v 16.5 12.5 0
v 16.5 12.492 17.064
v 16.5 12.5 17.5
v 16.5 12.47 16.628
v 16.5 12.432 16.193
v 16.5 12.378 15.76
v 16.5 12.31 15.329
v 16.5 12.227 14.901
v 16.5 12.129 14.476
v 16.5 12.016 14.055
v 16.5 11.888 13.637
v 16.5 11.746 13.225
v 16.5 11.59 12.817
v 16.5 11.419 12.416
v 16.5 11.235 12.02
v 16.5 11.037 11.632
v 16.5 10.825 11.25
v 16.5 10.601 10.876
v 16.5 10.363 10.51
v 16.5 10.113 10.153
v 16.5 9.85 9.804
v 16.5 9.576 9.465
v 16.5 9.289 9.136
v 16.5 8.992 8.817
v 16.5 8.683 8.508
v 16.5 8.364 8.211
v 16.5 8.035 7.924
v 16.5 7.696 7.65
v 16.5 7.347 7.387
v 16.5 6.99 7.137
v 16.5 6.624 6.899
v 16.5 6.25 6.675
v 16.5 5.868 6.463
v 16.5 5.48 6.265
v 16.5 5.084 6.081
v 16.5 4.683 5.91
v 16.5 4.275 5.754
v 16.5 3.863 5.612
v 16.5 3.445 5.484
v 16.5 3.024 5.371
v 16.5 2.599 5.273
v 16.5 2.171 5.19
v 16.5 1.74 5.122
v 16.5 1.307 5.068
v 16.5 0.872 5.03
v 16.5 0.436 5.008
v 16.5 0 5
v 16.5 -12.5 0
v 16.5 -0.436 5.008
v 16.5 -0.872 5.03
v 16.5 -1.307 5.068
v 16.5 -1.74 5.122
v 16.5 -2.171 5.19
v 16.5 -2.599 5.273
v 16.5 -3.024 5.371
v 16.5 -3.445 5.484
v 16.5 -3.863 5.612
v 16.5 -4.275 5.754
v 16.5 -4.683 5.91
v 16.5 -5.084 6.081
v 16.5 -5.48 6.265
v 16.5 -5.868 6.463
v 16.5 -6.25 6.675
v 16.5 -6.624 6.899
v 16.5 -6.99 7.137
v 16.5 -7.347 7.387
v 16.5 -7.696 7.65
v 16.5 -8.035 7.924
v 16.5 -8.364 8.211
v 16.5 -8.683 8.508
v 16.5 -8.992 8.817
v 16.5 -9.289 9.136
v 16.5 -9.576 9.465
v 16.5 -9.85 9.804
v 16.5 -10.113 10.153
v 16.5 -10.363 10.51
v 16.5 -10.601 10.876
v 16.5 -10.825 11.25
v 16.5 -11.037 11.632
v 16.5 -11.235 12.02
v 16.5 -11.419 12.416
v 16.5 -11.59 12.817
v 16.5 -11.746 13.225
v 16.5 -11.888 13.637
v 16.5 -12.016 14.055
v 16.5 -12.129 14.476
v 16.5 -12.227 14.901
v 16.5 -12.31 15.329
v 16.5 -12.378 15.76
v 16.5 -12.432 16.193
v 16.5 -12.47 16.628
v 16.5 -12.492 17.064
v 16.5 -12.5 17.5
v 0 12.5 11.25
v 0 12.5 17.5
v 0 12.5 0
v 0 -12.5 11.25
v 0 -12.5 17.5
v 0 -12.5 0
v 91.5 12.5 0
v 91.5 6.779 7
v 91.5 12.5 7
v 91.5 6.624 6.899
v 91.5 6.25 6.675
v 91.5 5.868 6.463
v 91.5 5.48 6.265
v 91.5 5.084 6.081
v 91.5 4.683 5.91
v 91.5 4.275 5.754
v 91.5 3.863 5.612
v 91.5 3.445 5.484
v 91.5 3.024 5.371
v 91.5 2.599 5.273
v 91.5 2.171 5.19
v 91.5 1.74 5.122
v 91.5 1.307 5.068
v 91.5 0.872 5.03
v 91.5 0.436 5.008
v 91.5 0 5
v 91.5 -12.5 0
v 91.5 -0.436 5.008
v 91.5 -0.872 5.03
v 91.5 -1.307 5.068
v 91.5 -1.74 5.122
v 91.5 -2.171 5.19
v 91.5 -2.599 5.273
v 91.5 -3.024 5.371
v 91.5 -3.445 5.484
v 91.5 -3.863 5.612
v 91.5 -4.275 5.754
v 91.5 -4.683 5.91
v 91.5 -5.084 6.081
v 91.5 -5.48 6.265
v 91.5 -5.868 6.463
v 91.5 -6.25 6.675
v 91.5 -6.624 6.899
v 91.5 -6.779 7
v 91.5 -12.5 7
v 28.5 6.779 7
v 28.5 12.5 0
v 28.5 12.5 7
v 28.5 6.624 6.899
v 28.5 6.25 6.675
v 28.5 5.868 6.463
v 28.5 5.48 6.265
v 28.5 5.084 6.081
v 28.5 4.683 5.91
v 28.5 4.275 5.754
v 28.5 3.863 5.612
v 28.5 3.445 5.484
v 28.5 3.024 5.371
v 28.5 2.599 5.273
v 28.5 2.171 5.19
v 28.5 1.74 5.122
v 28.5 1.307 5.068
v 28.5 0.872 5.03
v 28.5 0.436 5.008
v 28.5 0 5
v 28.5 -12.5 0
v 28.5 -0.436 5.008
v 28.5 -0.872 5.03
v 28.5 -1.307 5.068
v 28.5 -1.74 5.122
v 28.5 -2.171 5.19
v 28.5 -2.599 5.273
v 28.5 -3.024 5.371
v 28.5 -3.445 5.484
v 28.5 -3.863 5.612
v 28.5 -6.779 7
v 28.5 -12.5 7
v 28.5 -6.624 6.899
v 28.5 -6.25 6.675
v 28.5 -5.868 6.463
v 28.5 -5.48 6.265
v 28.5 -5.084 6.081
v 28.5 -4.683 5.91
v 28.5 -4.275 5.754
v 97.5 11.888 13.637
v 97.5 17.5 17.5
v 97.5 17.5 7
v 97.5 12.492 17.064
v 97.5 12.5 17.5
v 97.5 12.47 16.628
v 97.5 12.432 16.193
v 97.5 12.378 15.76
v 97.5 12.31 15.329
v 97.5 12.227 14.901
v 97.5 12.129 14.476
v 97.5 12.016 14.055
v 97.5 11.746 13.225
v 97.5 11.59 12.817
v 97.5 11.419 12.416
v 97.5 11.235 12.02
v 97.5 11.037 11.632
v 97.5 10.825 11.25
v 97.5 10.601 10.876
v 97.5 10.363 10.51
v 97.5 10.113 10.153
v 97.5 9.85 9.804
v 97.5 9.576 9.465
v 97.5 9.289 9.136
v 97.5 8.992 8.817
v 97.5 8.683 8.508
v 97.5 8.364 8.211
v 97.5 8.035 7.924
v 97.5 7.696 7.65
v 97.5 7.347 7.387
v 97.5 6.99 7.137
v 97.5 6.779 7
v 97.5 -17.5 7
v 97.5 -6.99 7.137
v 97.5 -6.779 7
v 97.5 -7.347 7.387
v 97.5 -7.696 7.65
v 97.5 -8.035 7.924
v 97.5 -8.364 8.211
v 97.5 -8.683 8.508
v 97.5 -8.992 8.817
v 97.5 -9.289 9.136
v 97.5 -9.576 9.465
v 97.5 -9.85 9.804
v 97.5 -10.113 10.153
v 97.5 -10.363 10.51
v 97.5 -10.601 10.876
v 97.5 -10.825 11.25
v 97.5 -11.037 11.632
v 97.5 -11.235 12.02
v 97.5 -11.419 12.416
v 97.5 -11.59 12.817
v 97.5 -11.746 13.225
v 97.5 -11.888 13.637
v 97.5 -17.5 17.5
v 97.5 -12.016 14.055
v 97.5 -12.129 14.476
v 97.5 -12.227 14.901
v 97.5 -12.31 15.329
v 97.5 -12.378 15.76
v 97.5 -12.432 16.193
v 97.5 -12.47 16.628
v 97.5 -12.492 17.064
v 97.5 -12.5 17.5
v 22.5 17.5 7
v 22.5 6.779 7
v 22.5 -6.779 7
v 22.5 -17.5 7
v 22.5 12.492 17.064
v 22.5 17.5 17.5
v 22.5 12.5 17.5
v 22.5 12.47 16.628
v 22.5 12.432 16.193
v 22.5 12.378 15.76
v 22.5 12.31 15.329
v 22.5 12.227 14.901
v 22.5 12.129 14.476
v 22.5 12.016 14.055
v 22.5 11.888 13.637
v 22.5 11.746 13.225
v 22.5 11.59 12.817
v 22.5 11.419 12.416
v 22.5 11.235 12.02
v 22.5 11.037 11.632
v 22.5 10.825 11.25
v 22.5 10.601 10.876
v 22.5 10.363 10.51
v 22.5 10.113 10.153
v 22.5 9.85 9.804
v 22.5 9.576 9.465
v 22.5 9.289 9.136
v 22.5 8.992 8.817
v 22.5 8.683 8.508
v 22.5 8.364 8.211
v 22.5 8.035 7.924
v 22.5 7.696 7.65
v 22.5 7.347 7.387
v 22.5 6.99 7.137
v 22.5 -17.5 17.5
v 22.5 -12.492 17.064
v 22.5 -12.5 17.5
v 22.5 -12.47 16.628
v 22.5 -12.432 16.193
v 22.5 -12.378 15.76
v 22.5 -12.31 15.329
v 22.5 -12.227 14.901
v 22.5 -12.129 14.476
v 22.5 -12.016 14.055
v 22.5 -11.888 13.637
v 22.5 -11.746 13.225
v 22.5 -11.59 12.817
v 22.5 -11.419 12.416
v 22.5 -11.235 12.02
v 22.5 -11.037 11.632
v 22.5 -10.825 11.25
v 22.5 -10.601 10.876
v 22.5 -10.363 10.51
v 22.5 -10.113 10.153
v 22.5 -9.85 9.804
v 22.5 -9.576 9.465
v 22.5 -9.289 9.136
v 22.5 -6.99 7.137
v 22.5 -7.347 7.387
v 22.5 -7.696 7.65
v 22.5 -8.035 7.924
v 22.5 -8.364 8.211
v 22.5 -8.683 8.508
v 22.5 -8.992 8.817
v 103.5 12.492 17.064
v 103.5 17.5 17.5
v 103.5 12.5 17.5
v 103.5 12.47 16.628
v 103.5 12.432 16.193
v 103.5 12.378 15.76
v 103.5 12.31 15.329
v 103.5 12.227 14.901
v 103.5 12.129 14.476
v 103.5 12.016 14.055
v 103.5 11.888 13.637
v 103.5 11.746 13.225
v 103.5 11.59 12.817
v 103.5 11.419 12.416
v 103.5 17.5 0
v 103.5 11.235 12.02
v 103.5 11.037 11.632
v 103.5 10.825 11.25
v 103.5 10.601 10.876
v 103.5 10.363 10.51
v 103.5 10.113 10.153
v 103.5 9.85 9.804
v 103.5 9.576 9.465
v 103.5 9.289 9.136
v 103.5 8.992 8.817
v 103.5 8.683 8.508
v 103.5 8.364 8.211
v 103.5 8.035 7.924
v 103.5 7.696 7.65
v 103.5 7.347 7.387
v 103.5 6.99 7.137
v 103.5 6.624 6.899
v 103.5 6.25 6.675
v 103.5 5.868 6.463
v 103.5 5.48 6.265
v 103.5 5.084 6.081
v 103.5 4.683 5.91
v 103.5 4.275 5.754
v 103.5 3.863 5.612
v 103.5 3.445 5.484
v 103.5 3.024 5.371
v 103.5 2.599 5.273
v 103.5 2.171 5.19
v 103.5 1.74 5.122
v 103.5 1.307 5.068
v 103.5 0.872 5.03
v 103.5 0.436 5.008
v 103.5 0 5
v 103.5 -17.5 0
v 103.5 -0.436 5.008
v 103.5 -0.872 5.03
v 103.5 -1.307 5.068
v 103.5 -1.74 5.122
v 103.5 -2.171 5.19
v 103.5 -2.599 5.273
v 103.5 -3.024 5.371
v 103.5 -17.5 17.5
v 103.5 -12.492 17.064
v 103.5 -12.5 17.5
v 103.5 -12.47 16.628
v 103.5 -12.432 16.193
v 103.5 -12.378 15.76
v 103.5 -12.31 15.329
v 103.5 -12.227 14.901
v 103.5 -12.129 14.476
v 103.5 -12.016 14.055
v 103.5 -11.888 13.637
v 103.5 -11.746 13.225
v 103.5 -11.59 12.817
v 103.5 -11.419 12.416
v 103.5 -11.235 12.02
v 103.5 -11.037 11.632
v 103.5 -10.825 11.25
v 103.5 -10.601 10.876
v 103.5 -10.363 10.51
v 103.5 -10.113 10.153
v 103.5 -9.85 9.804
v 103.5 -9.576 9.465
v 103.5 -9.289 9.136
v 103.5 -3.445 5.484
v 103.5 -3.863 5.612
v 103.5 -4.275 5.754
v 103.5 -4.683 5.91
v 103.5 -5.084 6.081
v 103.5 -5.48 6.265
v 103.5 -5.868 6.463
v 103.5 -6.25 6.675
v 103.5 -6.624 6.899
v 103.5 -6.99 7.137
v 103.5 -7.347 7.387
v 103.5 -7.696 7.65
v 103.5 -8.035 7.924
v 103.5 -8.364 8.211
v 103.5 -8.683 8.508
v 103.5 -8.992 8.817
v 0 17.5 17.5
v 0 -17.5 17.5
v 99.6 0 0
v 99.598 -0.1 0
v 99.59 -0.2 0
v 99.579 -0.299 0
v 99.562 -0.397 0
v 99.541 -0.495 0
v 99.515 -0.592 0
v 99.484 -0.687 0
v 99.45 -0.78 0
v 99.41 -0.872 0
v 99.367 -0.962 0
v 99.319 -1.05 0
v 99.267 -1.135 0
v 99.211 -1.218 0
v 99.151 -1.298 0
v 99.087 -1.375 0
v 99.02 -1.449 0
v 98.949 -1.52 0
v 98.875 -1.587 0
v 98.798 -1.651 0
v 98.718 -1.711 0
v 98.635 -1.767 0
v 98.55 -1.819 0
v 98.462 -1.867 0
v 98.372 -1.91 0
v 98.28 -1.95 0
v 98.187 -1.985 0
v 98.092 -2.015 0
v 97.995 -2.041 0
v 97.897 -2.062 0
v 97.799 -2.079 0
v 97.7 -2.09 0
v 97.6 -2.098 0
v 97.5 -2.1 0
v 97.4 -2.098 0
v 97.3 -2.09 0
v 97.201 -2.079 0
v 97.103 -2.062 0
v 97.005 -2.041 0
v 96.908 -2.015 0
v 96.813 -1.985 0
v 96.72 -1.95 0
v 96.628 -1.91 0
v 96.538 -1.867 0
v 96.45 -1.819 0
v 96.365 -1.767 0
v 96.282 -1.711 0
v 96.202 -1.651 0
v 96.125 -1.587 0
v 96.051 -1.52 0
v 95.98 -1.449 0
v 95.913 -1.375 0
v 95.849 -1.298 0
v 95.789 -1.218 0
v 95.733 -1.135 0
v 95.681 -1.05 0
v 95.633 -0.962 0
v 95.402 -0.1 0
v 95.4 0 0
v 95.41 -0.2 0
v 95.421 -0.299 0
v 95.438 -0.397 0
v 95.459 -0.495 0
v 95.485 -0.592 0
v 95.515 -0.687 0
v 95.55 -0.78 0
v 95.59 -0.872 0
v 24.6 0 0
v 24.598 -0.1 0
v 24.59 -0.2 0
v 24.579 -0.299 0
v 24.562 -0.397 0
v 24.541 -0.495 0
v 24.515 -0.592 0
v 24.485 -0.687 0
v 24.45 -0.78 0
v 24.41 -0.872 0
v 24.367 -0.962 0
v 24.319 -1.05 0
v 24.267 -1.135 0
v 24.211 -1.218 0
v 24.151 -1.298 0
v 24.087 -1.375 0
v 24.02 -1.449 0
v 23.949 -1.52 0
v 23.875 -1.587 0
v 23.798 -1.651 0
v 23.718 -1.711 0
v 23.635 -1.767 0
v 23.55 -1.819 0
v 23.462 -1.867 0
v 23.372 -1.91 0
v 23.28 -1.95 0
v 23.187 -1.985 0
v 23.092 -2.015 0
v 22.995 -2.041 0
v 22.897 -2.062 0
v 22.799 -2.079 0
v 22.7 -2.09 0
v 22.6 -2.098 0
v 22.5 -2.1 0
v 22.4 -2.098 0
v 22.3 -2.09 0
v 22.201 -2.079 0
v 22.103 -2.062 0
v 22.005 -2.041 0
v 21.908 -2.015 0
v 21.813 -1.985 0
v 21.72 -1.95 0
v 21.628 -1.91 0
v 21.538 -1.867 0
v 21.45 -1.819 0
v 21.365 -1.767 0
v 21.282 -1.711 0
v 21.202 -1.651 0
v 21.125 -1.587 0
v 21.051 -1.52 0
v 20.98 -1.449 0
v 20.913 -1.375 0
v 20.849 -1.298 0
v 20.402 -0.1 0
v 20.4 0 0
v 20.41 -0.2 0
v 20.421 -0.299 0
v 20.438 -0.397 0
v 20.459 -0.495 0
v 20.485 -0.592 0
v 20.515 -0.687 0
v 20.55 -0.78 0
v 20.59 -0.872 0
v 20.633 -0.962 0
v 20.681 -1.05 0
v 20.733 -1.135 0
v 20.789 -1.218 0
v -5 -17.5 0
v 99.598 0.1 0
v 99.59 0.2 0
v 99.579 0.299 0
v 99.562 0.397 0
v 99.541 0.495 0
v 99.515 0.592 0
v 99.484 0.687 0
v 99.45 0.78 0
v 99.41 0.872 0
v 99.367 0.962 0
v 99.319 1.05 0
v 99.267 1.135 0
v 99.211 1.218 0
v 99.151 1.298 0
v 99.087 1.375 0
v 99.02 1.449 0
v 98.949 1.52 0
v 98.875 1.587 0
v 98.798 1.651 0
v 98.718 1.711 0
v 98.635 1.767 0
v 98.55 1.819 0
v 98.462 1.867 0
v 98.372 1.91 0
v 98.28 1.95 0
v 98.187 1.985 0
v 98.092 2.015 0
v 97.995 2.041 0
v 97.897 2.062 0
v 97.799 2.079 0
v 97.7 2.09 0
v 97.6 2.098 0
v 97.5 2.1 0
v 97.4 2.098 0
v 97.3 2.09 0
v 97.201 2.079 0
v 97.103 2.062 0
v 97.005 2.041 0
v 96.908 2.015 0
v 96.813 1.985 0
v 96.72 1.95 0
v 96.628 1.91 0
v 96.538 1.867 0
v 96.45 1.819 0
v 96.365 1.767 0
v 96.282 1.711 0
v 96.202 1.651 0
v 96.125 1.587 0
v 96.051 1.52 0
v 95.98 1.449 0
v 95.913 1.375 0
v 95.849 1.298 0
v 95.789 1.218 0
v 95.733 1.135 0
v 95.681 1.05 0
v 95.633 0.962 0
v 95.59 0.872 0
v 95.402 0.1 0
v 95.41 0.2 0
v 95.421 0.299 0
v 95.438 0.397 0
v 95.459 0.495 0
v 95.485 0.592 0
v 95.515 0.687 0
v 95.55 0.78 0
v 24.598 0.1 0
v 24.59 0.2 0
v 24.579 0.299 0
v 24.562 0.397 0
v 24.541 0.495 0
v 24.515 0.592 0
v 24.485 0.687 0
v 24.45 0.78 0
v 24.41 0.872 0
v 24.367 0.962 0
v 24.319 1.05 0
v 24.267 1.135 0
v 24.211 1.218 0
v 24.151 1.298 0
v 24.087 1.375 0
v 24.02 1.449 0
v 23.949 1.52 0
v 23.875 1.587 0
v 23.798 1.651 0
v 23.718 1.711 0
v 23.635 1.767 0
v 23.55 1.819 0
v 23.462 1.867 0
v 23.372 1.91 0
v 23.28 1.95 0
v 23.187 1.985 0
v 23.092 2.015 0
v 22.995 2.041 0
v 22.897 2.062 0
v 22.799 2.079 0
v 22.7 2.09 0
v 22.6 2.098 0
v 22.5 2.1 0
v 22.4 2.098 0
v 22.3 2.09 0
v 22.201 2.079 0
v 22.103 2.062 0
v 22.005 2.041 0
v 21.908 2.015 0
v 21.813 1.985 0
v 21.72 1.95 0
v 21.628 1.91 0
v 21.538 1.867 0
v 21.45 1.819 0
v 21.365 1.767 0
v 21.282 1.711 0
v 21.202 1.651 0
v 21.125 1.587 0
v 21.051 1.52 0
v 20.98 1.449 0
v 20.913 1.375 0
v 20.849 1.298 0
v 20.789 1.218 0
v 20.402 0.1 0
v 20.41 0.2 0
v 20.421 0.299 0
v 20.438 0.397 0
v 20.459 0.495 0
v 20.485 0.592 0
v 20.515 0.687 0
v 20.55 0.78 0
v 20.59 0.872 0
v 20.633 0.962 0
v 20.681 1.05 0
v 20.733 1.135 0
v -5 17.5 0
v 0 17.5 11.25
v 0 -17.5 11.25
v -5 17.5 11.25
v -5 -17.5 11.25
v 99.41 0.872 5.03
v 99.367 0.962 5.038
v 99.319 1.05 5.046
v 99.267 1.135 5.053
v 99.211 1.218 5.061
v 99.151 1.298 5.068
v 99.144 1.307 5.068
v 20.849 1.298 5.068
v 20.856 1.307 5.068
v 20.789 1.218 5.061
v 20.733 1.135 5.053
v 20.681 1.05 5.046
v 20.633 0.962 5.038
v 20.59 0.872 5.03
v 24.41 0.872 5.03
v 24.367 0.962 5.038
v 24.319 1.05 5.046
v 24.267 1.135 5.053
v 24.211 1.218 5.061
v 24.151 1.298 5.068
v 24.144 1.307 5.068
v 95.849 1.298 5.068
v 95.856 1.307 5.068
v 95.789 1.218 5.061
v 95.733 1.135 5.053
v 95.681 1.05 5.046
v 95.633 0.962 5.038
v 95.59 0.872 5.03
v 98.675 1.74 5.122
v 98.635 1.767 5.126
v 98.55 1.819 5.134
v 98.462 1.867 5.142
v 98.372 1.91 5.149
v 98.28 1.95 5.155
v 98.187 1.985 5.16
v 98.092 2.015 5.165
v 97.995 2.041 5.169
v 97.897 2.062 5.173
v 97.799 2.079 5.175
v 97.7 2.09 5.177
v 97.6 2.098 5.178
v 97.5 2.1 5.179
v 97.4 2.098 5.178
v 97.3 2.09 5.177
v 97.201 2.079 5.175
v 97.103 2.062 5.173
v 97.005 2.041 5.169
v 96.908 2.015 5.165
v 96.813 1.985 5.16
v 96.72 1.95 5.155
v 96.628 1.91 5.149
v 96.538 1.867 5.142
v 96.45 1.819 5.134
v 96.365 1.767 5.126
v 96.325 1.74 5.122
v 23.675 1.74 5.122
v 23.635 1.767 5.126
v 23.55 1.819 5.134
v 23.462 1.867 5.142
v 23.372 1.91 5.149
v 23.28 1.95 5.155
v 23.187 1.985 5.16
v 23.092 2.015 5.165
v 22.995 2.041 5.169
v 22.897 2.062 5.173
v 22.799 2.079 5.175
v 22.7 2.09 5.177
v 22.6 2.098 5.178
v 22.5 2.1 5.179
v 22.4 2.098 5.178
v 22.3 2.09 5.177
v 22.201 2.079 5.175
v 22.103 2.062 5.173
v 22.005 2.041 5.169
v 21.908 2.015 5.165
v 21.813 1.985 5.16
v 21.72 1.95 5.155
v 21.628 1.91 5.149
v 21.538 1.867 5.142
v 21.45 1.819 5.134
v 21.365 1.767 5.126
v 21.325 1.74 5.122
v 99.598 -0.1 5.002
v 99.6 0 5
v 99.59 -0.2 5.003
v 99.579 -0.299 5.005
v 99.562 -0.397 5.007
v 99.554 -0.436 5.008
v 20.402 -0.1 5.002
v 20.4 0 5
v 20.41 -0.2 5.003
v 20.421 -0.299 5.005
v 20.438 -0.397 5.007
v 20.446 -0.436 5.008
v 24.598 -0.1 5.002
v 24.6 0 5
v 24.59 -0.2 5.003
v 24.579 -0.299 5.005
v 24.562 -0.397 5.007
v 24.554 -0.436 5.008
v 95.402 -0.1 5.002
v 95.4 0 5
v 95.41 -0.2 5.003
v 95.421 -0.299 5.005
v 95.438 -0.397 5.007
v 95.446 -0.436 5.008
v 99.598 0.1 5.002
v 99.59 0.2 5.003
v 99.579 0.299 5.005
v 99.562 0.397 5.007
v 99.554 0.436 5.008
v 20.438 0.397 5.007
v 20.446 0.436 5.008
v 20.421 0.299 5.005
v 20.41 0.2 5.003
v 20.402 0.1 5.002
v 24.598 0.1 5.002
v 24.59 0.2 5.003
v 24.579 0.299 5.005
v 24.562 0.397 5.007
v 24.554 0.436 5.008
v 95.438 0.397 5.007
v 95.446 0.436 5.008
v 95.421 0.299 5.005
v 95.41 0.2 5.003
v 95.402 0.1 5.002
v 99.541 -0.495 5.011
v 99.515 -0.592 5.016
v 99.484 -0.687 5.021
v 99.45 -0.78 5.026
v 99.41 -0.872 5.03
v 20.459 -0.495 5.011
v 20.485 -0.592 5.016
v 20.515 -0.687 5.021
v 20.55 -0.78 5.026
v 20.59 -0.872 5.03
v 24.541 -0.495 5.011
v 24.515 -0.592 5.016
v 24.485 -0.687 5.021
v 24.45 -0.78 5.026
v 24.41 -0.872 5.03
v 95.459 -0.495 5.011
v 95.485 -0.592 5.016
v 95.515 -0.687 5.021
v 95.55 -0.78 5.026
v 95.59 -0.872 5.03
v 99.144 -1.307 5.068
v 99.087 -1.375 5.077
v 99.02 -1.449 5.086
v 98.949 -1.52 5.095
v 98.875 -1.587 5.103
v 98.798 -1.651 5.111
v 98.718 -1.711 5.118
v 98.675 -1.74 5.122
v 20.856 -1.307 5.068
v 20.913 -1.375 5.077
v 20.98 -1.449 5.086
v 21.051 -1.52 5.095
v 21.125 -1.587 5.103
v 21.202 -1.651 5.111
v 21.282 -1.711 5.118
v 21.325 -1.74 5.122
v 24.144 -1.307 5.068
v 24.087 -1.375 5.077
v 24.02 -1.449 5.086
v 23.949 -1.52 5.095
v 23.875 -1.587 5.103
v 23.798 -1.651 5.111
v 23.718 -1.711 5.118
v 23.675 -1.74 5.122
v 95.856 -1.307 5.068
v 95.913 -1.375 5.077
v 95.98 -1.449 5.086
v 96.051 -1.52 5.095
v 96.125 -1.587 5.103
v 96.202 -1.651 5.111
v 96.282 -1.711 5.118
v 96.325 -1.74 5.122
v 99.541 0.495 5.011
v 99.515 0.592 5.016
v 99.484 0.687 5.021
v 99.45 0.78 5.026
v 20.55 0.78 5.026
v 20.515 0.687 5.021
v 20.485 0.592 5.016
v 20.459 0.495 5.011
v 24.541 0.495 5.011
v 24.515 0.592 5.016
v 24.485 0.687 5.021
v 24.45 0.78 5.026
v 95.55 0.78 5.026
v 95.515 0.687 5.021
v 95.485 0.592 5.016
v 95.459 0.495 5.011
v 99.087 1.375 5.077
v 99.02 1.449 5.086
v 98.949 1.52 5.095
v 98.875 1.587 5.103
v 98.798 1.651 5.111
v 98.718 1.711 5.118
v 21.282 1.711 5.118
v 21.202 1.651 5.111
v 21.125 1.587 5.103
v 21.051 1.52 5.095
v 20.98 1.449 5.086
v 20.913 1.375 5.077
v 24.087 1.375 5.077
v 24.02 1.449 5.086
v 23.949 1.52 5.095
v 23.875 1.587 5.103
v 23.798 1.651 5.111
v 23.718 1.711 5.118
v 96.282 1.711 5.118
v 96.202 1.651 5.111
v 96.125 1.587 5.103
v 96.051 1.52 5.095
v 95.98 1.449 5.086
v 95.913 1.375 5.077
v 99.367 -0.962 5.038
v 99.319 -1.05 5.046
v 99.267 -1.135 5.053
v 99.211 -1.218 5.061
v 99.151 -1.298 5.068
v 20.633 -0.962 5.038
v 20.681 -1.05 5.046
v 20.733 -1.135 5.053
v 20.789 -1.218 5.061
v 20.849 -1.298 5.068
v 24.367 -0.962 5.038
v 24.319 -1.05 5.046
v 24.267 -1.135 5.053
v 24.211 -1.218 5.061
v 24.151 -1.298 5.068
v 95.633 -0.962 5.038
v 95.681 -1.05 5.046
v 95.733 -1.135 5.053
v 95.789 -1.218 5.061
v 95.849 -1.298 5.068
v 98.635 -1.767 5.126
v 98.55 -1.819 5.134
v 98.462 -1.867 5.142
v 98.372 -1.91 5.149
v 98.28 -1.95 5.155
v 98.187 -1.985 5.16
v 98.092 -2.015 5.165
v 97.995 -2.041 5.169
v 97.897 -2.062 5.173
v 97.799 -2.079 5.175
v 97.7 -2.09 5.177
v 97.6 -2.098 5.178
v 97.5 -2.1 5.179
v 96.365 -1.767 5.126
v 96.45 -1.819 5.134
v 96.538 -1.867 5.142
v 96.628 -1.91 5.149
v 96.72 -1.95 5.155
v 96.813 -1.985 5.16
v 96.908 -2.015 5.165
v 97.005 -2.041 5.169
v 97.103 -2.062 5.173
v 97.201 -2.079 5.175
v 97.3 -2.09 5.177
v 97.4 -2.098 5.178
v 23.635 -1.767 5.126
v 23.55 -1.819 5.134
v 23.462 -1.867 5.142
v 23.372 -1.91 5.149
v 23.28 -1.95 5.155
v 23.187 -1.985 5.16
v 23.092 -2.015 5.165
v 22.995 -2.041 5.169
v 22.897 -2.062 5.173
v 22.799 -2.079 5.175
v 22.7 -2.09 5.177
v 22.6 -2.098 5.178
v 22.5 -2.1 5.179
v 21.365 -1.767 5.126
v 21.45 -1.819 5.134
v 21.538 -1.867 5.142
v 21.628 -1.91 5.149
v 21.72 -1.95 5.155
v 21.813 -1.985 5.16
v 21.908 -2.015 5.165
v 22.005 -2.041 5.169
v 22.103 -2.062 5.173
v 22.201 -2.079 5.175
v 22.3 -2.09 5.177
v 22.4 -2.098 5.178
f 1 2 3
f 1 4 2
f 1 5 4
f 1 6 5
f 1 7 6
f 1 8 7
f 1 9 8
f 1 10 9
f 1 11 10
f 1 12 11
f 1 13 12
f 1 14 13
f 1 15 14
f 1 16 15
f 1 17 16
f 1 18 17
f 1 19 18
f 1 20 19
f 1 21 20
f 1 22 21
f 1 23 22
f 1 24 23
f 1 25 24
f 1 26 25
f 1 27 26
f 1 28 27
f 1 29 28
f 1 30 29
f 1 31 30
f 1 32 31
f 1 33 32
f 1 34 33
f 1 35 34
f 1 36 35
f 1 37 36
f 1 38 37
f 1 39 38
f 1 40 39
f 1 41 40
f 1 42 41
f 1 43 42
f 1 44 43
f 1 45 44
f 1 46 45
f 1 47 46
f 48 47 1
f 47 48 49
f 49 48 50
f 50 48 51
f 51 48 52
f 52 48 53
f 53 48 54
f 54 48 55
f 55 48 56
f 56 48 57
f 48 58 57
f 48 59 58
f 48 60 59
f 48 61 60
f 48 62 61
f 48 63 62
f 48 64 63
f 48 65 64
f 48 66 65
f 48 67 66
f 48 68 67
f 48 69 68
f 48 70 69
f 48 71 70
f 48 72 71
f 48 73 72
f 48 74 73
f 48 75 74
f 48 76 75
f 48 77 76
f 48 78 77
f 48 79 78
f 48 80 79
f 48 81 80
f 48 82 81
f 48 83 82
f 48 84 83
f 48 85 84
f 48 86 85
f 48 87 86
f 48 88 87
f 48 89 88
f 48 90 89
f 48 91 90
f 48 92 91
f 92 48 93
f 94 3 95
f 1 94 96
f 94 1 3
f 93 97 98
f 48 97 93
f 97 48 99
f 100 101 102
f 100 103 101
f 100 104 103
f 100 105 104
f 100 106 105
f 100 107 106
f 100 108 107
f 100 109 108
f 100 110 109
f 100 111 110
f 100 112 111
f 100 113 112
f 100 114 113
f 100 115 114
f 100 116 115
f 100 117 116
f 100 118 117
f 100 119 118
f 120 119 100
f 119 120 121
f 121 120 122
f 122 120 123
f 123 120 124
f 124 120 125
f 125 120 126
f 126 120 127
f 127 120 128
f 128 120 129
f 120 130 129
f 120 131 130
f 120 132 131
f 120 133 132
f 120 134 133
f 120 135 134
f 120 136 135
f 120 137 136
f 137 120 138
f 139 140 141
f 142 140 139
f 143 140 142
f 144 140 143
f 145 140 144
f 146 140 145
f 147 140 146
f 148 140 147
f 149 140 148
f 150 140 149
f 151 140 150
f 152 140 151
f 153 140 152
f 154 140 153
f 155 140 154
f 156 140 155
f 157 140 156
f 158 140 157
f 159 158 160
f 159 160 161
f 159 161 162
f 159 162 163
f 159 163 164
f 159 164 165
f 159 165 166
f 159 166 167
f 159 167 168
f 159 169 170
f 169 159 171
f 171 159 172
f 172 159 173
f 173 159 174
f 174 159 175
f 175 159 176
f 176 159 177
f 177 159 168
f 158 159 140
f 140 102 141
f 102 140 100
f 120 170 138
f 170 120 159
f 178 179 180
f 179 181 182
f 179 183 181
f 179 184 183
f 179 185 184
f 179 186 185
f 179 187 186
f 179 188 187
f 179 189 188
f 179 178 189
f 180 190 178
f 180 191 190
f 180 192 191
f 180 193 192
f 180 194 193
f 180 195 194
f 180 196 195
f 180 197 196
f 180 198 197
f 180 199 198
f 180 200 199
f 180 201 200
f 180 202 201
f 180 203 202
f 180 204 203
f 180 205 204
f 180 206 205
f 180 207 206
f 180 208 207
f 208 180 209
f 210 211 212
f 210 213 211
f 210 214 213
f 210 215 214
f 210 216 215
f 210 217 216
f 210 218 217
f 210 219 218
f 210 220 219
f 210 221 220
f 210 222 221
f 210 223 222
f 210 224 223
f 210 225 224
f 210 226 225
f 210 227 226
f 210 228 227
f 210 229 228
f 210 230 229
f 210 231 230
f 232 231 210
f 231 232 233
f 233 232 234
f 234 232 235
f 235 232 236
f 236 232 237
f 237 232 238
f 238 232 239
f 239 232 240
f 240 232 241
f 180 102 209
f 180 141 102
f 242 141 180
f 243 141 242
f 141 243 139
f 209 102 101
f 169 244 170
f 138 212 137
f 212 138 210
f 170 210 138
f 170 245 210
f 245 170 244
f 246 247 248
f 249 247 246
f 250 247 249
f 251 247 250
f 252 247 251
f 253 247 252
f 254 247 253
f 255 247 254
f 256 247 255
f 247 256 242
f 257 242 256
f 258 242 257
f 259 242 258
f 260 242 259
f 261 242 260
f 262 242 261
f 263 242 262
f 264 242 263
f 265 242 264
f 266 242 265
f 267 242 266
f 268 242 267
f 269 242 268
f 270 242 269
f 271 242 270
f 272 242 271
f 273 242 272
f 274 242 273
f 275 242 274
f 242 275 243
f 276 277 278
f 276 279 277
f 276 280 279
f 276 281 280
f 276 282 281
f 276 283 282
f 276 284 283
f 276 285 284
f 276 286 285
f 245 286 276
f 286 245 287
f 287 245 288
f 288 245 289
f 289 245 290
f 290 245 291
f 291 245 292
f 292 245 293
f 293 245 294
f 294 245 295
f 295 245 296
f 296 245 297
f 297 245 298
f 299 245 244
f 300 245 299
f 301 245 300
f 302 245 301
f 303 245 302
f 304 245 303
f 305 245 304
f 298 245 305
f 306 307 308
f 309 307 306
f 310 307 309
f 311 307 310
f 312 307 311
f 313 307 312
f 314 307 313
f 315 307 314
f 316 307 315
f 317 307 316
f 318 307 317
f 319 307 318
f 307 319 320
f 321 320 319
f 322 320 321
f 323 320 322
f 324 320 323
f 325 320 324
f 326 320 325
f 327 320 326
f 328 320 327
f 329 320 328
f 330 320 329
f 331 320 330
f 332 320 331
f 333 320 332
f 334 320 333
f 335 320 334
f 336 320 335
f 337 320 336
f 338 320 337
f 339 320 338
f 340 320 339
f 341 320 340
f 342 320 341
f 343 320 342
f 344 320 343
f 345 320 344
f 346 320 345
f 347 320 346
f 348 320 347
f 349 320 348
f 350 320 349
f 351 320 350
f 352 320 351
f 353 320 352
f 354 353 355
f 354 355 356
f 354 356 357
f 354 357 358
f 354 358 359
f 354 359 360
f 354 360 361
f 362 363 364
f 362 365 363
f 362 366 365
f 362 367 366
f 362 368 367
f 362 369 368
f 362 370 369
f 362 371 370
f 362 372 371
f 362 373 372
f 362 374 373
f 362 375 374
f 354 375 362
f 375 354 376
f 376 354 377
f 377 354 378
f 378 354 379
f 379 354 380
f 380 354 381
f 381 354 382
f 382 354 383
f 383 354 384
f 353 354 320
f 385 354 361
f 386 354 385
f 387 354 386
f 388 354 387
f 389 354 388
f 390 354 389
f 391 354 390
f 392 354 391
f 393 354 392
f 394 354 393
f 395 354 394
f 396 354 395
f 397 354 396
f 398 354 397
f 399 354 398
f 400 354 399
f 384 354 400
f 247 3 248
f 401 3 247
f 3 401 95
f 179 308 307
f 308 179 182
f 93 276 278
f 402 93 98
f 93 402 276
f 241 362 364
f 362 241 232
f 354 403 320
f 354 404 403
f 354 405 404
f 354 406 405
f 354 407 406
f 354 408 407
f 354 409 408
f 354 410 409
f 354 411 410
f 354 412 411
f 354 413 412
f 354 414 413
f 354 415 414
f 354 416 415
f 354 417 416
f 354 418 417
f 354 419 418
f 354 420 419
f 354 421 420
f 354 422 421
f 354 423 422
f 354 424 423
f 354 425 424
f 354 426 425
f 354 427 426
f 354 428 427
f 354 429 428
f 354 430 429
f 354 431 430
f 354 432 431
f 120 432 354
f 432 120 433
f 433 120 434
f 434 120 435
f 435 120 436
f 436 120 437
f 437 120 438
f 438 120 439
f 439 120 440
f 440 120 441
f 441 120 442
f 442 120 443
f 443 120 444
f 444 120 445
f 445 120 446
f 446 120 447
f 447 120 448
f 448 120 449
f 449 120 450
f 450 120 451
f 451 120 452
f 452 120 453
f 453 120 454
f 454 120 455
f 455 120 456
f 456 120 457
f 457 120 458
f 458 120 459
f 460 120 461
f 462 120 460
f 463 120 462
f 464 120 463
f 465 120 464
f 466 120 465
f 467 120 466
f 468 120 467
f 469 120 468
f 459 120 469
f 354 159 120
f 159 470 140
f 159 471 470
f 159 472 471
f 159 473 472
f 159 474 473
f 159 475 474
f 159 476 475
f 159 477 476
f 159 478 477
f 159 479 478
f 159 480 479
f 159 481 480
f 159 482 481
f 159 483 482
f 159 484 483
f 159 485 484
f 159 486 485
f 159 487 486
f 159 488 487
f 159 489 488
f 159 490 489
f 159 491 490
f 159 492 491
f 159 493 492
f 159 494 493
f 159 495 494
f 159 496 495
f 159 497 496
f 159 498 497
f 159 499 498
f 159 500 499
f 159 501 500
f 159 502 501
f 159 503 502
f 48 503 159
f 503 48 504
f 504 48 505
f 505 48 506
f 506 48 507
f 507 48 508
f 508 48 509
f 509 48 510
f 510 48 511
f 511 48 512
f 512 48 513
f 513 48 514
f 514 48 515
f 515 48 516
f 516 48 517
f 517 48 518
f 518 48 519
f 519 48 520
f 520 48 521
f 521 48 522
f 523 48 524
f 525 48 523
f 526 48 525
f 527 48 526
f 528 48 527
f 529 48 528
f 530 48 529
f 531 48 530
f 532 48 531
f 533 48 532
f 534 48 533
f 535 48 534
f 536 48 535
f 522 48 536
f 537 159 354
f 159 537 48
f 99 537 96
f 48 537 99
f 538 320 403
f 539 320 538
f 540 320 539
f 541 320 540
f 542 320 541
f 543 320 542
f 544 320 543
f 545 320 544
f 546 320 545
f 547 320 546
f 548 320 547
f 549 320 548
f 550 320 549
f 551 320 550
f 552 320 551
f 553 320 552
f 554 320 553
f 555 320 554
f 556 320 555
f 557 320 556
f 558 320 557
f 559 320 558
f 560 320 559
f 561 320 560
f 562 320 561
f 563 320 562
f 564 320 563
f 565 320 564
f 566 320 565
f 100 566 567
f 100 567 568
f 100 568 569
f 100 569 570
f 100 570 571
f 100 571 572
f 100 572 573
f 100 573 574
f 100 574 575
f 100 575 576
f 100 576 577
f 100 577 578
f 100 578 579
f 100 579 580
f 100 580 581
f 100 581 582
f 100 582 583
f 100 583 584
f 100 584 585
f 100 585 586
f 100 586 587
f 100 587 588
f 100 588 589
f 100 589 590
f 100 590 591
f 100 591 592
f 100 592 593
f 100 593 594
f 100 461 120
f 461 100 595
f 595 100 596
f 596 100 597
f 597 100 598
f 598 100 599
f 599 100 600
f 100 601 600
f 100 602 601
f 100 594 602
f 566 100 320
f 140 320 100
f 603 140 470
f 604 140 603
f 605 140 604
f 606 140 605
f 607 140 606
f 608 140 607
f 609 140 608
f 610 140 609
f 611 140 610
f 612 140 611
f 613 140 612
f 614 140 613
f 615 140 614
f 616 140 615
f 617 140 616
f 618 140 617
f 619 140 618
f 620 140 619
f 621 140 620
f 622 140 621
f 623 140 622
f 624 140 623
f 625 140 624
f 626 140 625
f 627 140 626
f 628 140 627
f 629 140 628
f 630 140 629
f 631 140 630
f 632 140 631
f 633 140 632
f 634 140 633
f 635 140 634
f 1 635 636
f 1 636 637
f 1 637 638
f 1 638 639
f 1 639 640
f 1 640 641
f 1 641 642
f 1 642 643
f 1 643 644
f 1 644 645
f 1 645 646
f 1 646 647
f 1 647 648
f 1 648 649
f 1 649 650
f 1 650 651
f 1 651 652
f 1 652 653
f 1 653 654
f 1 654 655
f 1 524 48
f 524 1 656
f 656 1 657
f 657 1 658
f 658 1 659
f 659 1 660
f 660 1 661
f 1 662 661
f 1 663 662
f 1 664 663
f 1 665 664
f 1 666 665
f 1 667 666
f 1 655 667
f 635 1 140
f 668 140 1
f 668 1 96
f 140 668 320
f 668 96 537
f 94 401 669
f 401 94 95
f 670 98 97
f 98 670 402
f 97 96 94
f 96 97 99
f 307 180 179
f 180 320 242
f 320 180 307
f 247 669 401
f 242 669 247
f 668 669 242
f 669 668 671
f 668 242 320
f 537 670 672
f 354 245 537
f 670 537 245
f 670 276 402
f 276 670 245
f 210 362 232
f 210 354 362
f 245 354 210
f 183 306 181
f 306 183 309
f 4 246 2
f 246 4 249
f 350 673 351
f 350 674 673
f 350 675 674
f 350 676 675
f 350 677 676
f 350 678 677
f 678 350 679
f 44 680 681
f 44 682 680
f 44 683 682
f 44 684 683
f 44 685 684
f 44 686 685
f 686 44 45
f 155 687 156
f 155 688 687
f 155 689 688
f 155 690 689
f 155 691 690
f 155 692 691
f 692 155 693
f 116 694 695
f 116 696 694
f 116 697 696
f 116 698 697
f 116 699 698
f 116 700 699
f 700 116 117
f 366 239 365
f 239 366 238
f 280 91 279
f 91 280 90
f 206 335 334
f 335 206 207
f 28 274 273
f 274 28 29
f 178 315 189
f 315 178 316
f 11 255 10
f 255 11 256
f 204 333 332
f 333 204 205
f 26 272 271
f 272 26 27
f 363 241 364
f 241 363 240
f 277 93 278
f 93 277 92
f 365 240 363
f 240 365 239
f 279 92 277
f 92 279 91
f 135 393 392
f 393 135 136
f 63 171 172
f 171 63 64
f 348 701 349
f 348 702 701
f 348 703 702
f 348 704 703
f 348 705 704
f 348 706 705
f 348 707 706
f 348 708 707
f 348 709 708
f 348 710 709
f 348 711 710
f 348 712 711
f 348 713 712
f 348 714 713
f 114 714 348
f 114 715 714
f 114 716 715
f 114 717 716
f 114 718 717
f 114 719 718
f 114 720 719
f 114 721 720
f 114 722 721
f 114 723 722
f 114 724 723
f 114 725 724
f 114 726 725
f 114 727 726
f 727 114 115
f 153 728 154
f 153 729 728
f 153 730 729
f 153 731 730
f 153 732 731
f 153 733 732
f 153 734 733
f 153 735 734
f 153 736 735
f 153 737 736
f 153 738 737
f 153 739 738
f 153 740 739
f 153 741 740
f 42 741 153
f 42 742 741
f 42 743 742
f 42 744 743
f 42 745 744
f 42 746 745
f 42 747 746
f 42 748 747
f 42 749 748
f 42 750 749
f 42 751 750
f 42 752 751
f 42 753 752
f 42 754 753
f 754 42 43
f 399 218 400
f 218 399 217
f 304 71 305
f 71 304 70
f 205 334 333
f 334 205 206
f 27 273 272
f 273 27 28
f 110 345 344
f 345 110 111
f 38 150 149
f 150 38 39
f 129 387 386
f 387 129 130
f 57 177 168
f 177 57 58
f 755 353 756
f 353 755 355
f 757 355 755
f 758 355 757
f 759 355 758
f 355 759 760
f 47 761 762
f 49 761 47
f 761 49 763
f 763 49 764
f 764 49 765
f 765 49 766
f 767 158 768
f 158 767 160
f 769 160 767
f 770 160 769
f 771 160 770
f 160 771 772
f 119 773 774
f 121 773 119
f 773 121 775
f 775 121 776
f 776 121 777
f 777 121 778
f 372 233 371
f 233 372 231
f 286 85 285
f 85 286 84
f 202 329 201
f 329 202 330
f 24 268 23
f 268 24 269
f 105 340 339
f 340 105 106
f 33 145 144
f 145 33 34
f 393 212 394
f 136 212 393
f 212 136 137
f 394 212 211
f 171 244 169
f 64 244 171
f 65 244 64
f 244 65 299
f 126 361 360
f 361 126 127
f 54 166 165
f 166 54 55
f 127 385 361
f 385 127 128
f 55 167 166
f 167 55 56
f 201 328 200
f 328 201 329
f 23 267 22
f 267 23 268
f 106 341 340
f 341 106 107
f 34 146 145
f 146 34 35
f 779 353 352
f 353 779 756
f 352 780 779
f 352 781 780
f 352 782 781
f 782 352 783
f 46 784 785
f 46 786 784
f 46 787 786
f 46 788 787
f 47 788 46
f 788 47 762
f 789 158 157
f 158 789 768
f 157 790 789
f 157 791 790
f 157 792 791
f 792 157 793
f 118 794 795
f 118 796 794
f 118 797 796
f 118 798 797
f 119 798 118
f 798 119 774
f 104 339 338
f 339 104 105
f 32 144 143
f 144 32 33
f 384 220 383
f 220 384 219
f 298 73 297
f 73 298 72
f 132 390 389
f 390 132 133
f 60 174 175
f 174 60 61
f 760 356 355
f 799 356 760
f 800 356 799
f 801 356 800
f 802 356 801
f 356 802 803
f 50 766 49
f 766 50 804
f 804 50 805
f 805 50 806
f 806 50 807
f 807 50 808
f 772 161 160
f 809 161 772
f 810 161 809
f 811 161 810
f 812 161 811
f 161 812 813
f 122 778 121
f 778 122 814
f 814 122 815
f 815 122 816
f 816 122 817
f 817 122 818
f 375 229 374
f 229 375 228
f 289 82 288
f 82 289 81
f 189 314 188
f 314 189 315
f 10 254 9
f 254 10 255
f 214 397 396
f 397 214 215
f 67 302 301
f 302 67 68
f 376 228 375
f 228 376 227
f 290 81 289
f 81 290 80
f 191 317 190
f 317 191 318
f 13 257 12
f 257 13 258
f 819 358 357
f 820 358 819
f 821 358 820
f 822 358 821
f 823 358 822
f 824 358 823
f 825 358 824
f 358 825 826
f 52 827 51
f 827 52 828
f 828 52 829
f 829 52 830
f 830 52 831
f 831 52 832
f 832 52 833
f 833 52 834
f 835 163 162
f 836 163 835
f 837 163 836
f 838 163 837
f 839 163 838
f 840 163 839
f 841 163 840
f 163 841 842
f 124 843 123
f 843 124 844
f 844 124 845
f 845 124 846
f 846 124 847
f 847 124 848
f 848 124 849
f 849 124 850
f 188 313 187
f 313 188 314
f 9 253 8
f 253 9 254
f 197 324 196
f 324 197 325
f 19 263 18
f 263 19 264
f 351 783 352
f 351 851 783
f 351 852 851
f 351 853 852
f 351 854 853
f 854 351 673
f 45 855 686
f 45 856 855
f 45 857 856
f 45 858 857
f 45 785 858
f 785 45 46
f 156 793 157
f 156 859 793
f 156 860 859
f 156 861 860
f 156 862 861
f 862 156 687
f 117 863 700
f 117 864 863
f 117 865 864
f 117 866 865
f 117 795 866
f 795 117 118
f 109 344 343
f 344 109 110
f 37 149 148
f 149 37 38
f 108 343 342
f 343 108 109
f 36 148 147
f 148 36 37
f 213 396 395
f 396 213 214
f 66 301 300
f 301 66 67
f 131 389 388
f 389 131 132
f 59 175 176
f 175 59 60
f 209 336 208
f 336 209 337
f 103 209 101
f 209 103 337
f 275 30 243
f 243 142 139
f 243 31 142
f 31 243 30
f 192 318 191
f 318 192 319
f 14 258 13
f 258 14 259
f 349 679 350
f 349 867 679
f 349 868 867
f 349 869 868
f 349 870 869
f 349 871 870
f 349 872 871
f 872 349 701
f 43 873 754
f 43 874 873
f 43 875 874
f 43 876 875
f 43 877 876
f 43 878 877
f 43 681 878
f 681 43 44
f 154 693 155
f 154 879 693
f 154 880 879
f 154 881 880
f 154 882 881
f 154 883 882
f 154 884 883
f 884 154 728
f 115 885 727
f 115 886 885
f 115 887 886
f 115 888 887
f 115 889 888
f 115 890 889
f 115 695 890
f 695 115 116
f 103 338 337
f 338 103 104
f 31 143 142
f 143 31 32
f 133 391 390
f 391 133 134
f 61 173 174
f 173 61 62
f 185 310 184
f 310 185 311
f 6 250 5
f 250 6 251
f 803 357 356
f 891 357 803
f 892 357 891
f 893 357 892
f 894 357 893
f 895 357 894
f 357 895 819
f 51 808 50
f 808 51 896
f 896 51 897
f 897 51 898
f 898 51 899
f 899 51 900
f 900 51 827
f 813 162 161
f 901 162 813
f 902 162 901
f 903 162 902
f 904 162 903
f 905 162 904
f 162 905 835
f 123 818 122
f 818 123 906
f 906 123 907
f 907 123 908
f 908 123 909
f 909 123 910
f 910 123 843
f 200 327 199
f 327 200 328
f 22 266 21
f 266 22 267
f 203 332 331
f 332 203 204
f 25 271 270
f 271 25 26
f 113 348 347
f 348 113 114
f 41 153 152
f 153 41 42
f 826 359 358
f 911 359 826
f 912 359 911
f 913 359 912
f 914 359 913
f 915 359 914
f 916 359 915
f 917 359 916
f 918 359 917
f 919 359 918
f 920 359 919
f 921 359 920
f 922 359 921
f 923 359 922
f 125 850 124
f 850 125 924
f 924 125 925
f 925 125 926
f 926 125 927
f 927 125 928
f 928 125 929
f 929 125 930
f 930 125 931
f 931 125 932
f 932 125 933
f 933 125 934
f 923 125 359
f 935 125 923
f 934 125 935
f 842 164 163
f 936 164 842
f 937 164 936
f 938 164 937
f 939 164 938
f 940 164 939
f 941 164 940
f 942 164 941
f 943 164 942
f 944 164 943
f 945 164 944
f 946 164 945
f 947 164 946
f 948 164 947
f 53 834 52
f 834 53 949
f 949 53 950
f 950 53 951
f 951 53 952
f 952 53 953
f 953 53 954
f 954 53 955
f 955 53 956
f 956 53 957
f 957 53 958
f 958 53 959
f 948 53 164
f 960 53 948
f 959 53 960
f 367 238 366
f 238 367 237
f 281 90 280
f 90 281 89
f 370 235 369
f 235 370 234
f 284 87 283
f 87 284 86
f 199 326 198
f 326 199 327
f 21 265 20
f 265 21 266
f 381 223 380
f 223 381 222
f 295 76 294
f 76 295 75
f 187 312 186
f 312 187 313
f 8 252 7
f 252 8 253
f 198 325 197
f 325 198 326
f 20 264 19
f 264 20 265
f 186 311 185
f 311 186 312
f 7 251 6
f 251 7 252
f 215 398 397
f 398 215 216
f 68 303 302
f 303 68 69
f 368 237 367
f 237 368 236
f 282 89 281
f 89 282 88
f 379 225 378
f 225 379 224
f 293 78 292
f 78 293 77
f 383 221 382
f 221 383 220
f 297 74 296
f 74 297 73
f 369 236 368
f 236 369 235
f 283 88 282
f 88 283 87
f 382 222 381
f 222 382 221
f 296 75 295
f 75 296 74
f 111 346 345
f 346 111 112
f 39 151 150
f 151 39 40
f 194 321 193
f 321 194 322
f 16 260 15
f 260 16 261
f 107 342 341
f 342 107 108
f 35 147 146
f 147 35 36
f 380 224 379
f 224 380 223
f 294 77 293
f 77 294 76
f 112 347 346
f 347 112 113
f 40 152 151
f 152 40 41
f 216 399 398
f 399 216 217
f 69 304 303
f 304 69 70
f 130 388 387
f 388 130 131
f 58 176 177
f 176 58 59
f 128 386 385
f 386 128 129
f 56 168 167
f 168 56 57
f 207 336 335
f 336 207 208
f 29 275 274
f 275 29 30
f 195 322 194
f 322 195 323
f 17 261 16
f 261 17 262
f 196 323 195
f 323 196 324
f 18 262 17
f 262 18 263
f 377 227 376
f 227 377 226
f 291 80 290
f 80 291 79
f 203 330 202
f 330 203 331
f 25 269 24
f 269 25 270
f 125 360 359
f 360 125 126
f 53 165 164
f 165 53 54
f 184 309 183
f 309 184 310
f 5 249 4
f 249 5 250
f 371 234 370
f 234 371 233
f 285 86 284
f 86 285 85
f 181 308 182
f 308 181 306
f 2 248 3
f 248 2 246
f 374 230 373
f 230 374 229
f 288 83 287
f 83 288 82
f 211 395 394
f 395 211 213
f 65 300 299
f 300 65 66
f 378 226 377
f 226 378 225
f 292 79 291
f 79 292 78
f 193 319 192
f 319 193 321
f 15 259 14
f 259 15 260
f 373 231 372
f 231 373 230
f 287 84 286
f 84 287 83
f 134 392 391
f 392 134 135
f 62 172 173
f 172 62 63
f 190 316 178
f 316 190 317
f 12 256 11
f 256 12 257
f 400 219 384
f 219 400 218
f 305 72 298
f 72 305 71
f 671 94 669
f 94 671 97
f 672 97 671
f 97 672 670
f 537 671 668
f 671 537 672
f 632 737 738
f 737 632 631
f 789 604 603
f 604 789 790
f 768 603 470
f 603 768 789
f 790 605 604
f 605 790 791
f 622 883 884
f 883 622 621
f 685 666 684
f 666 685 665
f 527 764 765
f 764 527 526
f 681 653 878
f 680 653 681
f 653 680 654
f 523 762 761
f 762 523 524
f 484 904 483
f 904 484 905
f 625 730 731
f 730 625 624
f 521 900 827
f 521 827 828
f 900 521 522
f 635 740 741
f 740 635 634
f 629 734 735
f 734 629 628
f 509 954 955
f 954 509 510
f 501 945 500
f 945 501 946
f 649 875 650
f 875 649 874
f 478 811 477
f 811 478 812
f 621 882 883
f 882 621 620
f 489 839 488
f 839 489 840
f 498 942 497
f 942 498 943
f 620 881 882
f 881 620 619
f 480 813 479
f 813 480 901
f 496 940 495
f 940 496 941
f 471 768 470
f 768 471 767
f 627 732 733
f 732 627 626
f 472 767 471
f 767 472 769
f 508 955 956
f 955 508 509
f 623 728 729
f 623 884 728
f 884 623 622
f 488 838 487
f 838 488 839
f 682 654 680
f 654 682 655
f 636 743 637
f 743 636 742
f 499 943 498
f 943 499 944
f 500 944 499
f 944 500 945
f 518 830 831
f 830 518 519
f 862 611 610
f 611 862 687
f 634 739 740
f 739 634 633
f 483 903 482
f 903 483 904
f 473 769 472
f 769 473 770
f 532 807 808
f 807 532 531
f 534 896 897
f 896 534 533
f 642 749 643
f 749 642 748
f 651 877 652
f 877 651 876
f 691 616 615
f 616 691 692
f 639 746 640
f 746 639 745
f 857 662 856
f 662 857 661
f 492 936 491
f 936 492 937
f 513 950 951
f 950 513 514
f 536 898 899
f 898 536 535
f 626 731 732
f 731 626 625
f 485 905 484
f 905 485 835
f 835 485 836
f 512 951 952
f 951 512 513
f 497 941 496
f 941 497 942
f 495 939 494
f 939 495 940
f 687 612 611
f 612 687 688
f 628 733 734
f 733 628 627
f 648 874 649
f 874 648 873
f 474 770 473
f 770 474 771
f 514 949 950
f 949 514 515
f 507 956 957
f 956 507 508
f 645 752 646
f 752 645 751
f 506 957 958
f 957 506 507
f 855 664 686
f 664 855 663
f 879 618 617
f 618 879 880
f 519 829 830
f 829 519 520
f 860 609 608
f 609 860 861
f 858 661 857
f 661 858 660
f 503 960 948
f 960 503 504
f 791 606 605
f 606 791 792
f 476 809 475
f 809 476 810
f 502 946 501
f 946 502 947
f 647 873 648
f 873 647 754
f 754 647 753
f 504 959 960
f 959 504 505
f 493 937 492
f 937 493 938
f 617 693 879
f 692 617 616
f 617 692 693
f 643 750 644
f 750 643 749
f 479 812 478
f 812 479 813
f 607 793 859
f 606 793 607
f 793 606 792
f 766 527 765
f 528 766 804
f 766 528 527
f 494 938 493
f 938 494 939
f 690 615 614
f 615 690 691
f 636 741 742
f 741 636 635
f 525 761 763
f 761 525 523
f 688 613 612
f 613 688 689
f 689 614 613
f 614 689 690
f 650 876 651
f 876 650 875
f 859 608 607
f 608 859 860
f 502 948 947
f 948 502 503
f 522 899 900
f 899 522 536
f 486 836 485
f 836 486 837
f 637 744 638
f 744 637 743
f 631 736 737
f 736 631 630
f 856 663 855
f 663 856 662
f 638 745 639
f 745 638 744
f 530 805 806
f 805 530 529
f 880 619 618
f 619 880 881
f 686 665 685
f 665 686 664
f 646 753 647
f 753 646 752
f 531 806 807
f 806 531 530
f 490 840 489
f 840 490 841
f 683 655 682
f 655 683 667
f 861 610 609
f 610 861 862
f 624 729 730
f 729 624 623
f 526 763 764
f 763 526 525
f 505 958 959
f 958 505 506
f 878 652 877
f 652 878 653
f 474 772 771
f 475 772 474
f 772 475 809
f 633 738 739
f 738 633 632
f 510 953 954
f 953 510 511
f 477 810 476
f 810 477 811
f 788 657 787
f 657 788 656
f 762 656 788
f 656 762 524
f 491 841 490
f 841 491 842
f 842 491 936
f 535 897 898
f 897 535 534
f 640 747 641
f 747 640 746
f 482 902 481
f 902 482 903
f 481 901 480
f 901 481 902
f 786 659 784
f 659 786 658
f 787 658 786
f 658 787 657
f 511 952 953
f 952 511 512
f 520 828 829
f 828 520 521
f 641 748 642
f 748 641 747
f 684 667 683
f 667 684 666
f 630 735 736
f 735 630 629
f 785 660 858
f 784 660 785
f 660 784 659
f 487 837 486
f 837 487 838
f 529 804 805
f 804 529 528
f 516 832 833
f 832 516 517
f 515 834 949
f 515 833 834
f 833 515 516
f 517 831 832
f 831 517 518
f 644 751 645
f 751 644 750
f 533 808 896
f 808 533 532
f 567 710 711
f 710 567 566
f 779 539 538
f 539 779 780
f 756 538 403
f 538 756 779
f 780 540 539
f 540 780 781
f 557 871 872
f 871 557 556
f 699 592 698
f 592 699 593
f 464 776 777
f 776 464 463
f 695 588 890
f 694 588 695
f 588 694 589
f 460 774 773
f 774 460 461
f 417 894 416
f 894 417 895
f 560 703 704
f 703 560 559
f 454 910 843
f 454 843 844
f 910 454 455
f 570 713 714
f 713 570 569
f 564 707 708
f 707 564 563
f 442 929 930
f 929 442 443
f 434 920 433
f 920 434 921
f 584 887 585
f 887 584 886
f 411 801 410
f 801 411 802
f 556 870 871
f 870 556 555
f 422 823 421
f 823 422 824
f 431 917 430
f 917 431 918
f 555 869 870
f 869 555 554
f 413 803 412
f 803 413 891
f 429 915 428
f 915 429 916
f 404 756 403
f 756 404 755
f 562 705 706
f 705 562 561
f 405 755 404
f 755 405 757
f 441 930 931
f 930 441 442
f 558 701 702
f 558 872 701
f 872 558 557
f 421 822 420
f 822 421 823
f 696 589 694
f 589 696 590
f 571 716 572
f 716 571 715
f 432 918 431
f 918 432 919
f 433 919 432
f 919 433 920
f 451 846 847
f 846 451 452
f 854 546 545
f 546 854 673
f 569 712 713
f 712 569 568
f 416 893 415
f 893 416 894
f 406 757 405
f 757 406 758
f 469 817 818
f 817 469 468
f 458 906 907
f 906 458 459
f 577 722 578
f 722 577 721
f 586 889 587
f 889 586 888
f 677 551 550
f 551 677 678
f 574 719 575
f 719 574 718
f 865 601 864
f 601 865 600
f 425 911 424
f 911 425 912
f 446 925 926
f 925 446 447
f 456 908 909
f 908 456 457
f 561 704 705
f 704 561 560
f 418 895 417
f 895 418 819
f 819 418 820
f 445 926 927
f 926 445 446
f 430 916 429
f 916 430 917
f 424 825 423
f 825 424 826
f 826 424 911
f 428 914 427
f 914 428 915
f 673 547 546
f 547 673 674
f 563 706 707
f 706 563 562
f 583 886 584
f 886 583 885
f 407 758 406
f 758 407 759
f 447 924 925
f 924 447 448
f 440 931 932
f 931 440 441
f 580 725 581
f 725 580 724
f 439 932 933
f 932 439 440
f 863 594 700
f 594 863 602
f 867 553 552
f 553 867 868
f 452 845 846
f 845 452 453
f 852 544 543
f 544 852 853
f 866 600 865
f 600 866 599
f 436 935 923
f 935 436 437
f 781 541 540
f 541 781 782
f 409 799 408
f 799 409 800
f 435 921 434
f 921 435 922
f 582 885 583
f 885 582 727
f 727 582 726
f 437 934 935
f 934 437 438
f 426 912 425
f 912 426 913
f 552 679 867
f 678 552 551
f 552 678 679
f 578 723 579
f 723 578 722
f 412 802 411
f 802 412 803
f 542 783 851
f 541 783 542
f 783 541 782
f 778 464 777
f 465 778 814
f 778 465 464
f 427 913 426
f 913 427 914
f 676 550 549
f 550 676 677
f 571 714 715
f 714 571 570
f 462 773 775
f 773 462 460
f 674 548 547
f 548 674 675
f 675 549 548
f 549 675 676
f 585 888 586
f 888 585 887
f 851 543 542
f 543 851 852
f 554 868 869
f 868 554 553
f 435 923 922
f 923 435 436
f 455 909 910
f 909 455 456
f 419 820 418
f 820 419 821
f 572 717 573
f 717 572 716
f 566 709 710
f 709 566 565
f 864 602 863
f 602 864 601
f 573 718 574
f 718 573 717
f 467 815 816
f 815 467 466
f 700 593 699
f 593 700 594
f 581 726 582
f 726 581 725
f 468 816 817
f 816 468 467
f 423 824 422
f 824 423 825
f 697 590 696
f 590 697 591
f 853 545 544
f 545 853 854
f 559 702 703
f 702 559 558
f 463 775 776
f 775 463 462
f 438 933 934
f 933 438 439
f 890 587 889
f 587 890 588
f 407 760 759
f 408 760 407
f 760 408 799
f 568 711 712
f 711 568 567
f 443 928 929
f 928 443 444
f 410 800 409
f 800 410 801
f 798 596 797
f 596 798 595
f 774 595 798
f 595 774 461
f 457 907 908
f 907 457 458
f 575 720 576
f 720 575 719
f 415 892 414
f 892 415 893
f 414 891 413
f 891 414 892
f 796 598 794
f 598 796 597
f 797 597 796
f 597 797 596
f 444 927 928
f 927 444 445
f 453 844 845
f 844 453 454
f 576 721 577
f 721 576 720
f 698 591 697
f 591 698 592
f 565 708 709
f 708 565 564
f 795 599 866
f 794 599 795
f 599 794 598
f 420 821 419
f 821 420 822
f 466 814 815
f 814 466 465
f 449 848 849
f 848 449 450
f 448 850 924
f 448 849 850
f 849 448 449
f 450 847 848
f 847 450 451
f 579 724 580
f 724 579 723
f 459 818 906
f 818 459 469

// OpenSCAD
// MPCNC nut trap drill guide
// https://www.thingiverse.com/thing:3038859
// Robbert Klarenbeek
//
// Remixed from https://www.thingiverse.com/thing:910707 (by GeoDave)
//
// - Uses standard spacings as shown on MPCNC assembly page
// - Built for 25mm conduit (international "F" version)
// - Uses $fn = 0 in order to create smooth arcs when imported
//   into FreeCAD, which in turn generates a smooth STEP export

// Size of the conduit used / MPCNC version
conduit_outer_diameter = 25; // [23.5:Version C (23.5mm), 25:Version F (25mm), 25.4:Version J (25.4mm)]
// How far from the bottom the 1st hole will be
first_hole_position = 22.5;
// The distance between the 1st and 2nd hole
hole_distance = 75;
// Thickness of the walls holding the conduit
wall_thickness = 5;
// Diameter of the drill holes
drill_hole_diameter = 4.2;
// Space on both sides of the drill holes
drill_hole_clearance = 6;

// Create anonymous scope to hide from customizer
{
    $fn = 0; // Keep at 0 for smooth FreeCAD import / STEP output
    $fa = 2;
    $fs = 0.1;

    cut_margin = 1;
    
    second_hole_position = first_hole_position + hole_distance;
    length = second_hole_position + drill_hole_clearance;
    width = conduit_outer_diameter + 2 * wall_thickness;
    height = conduit_outer_diameter / 2 + wall_thickness;
    cut_height = height + cut_margin * 2;
    
    first_cut_offset = -cut_margin;
    first_cut_length = first_hole_position - drill_hole_clearance + cut_margin;
    second_cut_offset = first_hole_position + drill_hole_clearance;
    second_cut_length = hole_distance - drill_hole_clearance * 2;
}

module Holder() {
    difference() {
        translate([0, -width / 2, 0])
            cube([length, width, height]);
        rotate([0, 90, 0]) translate([-height, 0, -cut_margin])
            cylinder(d = conduit_outer_diameter, h = length + cut_margin * 2);
        
        Trim();
    }
    translate([-wall_thickness, -width / 2, 0])
        cube([wall_thickness, width, wall_thickness + conduit_outer_diameter / 4]);
}

module Trim() {
    translate([first_cut_offset, -conduit_outer_diameter / 2, -cut_margin])
        cube([first_cut_length, conduit_outer_diameter, cut_height]);

    translate([second_cut_offset, -conduit_outer_diameter / 2, -cut_margin])
        cube([second_cut_length, conduit_outer_diameter, cut_height]);

    translate([first_hole_position, -(width + cut_margin * 2) / 2, wall_thickness + 2])
        cube([hole_distance, width + cut_margin * 2, cut_height]);
}

module DrillHole() {
    translate([0, 0, -cut_margin])
        cylinder(d = drill_hole_diameter, h = cut_height);
}

module Thing() {
    difference() {
        Holder();
        translate([first_hole_position, 0, 0])
            DrillHole();
        translate([second_hole_position, 0, 0])
            DrillHole();
    }
}

Thing();
